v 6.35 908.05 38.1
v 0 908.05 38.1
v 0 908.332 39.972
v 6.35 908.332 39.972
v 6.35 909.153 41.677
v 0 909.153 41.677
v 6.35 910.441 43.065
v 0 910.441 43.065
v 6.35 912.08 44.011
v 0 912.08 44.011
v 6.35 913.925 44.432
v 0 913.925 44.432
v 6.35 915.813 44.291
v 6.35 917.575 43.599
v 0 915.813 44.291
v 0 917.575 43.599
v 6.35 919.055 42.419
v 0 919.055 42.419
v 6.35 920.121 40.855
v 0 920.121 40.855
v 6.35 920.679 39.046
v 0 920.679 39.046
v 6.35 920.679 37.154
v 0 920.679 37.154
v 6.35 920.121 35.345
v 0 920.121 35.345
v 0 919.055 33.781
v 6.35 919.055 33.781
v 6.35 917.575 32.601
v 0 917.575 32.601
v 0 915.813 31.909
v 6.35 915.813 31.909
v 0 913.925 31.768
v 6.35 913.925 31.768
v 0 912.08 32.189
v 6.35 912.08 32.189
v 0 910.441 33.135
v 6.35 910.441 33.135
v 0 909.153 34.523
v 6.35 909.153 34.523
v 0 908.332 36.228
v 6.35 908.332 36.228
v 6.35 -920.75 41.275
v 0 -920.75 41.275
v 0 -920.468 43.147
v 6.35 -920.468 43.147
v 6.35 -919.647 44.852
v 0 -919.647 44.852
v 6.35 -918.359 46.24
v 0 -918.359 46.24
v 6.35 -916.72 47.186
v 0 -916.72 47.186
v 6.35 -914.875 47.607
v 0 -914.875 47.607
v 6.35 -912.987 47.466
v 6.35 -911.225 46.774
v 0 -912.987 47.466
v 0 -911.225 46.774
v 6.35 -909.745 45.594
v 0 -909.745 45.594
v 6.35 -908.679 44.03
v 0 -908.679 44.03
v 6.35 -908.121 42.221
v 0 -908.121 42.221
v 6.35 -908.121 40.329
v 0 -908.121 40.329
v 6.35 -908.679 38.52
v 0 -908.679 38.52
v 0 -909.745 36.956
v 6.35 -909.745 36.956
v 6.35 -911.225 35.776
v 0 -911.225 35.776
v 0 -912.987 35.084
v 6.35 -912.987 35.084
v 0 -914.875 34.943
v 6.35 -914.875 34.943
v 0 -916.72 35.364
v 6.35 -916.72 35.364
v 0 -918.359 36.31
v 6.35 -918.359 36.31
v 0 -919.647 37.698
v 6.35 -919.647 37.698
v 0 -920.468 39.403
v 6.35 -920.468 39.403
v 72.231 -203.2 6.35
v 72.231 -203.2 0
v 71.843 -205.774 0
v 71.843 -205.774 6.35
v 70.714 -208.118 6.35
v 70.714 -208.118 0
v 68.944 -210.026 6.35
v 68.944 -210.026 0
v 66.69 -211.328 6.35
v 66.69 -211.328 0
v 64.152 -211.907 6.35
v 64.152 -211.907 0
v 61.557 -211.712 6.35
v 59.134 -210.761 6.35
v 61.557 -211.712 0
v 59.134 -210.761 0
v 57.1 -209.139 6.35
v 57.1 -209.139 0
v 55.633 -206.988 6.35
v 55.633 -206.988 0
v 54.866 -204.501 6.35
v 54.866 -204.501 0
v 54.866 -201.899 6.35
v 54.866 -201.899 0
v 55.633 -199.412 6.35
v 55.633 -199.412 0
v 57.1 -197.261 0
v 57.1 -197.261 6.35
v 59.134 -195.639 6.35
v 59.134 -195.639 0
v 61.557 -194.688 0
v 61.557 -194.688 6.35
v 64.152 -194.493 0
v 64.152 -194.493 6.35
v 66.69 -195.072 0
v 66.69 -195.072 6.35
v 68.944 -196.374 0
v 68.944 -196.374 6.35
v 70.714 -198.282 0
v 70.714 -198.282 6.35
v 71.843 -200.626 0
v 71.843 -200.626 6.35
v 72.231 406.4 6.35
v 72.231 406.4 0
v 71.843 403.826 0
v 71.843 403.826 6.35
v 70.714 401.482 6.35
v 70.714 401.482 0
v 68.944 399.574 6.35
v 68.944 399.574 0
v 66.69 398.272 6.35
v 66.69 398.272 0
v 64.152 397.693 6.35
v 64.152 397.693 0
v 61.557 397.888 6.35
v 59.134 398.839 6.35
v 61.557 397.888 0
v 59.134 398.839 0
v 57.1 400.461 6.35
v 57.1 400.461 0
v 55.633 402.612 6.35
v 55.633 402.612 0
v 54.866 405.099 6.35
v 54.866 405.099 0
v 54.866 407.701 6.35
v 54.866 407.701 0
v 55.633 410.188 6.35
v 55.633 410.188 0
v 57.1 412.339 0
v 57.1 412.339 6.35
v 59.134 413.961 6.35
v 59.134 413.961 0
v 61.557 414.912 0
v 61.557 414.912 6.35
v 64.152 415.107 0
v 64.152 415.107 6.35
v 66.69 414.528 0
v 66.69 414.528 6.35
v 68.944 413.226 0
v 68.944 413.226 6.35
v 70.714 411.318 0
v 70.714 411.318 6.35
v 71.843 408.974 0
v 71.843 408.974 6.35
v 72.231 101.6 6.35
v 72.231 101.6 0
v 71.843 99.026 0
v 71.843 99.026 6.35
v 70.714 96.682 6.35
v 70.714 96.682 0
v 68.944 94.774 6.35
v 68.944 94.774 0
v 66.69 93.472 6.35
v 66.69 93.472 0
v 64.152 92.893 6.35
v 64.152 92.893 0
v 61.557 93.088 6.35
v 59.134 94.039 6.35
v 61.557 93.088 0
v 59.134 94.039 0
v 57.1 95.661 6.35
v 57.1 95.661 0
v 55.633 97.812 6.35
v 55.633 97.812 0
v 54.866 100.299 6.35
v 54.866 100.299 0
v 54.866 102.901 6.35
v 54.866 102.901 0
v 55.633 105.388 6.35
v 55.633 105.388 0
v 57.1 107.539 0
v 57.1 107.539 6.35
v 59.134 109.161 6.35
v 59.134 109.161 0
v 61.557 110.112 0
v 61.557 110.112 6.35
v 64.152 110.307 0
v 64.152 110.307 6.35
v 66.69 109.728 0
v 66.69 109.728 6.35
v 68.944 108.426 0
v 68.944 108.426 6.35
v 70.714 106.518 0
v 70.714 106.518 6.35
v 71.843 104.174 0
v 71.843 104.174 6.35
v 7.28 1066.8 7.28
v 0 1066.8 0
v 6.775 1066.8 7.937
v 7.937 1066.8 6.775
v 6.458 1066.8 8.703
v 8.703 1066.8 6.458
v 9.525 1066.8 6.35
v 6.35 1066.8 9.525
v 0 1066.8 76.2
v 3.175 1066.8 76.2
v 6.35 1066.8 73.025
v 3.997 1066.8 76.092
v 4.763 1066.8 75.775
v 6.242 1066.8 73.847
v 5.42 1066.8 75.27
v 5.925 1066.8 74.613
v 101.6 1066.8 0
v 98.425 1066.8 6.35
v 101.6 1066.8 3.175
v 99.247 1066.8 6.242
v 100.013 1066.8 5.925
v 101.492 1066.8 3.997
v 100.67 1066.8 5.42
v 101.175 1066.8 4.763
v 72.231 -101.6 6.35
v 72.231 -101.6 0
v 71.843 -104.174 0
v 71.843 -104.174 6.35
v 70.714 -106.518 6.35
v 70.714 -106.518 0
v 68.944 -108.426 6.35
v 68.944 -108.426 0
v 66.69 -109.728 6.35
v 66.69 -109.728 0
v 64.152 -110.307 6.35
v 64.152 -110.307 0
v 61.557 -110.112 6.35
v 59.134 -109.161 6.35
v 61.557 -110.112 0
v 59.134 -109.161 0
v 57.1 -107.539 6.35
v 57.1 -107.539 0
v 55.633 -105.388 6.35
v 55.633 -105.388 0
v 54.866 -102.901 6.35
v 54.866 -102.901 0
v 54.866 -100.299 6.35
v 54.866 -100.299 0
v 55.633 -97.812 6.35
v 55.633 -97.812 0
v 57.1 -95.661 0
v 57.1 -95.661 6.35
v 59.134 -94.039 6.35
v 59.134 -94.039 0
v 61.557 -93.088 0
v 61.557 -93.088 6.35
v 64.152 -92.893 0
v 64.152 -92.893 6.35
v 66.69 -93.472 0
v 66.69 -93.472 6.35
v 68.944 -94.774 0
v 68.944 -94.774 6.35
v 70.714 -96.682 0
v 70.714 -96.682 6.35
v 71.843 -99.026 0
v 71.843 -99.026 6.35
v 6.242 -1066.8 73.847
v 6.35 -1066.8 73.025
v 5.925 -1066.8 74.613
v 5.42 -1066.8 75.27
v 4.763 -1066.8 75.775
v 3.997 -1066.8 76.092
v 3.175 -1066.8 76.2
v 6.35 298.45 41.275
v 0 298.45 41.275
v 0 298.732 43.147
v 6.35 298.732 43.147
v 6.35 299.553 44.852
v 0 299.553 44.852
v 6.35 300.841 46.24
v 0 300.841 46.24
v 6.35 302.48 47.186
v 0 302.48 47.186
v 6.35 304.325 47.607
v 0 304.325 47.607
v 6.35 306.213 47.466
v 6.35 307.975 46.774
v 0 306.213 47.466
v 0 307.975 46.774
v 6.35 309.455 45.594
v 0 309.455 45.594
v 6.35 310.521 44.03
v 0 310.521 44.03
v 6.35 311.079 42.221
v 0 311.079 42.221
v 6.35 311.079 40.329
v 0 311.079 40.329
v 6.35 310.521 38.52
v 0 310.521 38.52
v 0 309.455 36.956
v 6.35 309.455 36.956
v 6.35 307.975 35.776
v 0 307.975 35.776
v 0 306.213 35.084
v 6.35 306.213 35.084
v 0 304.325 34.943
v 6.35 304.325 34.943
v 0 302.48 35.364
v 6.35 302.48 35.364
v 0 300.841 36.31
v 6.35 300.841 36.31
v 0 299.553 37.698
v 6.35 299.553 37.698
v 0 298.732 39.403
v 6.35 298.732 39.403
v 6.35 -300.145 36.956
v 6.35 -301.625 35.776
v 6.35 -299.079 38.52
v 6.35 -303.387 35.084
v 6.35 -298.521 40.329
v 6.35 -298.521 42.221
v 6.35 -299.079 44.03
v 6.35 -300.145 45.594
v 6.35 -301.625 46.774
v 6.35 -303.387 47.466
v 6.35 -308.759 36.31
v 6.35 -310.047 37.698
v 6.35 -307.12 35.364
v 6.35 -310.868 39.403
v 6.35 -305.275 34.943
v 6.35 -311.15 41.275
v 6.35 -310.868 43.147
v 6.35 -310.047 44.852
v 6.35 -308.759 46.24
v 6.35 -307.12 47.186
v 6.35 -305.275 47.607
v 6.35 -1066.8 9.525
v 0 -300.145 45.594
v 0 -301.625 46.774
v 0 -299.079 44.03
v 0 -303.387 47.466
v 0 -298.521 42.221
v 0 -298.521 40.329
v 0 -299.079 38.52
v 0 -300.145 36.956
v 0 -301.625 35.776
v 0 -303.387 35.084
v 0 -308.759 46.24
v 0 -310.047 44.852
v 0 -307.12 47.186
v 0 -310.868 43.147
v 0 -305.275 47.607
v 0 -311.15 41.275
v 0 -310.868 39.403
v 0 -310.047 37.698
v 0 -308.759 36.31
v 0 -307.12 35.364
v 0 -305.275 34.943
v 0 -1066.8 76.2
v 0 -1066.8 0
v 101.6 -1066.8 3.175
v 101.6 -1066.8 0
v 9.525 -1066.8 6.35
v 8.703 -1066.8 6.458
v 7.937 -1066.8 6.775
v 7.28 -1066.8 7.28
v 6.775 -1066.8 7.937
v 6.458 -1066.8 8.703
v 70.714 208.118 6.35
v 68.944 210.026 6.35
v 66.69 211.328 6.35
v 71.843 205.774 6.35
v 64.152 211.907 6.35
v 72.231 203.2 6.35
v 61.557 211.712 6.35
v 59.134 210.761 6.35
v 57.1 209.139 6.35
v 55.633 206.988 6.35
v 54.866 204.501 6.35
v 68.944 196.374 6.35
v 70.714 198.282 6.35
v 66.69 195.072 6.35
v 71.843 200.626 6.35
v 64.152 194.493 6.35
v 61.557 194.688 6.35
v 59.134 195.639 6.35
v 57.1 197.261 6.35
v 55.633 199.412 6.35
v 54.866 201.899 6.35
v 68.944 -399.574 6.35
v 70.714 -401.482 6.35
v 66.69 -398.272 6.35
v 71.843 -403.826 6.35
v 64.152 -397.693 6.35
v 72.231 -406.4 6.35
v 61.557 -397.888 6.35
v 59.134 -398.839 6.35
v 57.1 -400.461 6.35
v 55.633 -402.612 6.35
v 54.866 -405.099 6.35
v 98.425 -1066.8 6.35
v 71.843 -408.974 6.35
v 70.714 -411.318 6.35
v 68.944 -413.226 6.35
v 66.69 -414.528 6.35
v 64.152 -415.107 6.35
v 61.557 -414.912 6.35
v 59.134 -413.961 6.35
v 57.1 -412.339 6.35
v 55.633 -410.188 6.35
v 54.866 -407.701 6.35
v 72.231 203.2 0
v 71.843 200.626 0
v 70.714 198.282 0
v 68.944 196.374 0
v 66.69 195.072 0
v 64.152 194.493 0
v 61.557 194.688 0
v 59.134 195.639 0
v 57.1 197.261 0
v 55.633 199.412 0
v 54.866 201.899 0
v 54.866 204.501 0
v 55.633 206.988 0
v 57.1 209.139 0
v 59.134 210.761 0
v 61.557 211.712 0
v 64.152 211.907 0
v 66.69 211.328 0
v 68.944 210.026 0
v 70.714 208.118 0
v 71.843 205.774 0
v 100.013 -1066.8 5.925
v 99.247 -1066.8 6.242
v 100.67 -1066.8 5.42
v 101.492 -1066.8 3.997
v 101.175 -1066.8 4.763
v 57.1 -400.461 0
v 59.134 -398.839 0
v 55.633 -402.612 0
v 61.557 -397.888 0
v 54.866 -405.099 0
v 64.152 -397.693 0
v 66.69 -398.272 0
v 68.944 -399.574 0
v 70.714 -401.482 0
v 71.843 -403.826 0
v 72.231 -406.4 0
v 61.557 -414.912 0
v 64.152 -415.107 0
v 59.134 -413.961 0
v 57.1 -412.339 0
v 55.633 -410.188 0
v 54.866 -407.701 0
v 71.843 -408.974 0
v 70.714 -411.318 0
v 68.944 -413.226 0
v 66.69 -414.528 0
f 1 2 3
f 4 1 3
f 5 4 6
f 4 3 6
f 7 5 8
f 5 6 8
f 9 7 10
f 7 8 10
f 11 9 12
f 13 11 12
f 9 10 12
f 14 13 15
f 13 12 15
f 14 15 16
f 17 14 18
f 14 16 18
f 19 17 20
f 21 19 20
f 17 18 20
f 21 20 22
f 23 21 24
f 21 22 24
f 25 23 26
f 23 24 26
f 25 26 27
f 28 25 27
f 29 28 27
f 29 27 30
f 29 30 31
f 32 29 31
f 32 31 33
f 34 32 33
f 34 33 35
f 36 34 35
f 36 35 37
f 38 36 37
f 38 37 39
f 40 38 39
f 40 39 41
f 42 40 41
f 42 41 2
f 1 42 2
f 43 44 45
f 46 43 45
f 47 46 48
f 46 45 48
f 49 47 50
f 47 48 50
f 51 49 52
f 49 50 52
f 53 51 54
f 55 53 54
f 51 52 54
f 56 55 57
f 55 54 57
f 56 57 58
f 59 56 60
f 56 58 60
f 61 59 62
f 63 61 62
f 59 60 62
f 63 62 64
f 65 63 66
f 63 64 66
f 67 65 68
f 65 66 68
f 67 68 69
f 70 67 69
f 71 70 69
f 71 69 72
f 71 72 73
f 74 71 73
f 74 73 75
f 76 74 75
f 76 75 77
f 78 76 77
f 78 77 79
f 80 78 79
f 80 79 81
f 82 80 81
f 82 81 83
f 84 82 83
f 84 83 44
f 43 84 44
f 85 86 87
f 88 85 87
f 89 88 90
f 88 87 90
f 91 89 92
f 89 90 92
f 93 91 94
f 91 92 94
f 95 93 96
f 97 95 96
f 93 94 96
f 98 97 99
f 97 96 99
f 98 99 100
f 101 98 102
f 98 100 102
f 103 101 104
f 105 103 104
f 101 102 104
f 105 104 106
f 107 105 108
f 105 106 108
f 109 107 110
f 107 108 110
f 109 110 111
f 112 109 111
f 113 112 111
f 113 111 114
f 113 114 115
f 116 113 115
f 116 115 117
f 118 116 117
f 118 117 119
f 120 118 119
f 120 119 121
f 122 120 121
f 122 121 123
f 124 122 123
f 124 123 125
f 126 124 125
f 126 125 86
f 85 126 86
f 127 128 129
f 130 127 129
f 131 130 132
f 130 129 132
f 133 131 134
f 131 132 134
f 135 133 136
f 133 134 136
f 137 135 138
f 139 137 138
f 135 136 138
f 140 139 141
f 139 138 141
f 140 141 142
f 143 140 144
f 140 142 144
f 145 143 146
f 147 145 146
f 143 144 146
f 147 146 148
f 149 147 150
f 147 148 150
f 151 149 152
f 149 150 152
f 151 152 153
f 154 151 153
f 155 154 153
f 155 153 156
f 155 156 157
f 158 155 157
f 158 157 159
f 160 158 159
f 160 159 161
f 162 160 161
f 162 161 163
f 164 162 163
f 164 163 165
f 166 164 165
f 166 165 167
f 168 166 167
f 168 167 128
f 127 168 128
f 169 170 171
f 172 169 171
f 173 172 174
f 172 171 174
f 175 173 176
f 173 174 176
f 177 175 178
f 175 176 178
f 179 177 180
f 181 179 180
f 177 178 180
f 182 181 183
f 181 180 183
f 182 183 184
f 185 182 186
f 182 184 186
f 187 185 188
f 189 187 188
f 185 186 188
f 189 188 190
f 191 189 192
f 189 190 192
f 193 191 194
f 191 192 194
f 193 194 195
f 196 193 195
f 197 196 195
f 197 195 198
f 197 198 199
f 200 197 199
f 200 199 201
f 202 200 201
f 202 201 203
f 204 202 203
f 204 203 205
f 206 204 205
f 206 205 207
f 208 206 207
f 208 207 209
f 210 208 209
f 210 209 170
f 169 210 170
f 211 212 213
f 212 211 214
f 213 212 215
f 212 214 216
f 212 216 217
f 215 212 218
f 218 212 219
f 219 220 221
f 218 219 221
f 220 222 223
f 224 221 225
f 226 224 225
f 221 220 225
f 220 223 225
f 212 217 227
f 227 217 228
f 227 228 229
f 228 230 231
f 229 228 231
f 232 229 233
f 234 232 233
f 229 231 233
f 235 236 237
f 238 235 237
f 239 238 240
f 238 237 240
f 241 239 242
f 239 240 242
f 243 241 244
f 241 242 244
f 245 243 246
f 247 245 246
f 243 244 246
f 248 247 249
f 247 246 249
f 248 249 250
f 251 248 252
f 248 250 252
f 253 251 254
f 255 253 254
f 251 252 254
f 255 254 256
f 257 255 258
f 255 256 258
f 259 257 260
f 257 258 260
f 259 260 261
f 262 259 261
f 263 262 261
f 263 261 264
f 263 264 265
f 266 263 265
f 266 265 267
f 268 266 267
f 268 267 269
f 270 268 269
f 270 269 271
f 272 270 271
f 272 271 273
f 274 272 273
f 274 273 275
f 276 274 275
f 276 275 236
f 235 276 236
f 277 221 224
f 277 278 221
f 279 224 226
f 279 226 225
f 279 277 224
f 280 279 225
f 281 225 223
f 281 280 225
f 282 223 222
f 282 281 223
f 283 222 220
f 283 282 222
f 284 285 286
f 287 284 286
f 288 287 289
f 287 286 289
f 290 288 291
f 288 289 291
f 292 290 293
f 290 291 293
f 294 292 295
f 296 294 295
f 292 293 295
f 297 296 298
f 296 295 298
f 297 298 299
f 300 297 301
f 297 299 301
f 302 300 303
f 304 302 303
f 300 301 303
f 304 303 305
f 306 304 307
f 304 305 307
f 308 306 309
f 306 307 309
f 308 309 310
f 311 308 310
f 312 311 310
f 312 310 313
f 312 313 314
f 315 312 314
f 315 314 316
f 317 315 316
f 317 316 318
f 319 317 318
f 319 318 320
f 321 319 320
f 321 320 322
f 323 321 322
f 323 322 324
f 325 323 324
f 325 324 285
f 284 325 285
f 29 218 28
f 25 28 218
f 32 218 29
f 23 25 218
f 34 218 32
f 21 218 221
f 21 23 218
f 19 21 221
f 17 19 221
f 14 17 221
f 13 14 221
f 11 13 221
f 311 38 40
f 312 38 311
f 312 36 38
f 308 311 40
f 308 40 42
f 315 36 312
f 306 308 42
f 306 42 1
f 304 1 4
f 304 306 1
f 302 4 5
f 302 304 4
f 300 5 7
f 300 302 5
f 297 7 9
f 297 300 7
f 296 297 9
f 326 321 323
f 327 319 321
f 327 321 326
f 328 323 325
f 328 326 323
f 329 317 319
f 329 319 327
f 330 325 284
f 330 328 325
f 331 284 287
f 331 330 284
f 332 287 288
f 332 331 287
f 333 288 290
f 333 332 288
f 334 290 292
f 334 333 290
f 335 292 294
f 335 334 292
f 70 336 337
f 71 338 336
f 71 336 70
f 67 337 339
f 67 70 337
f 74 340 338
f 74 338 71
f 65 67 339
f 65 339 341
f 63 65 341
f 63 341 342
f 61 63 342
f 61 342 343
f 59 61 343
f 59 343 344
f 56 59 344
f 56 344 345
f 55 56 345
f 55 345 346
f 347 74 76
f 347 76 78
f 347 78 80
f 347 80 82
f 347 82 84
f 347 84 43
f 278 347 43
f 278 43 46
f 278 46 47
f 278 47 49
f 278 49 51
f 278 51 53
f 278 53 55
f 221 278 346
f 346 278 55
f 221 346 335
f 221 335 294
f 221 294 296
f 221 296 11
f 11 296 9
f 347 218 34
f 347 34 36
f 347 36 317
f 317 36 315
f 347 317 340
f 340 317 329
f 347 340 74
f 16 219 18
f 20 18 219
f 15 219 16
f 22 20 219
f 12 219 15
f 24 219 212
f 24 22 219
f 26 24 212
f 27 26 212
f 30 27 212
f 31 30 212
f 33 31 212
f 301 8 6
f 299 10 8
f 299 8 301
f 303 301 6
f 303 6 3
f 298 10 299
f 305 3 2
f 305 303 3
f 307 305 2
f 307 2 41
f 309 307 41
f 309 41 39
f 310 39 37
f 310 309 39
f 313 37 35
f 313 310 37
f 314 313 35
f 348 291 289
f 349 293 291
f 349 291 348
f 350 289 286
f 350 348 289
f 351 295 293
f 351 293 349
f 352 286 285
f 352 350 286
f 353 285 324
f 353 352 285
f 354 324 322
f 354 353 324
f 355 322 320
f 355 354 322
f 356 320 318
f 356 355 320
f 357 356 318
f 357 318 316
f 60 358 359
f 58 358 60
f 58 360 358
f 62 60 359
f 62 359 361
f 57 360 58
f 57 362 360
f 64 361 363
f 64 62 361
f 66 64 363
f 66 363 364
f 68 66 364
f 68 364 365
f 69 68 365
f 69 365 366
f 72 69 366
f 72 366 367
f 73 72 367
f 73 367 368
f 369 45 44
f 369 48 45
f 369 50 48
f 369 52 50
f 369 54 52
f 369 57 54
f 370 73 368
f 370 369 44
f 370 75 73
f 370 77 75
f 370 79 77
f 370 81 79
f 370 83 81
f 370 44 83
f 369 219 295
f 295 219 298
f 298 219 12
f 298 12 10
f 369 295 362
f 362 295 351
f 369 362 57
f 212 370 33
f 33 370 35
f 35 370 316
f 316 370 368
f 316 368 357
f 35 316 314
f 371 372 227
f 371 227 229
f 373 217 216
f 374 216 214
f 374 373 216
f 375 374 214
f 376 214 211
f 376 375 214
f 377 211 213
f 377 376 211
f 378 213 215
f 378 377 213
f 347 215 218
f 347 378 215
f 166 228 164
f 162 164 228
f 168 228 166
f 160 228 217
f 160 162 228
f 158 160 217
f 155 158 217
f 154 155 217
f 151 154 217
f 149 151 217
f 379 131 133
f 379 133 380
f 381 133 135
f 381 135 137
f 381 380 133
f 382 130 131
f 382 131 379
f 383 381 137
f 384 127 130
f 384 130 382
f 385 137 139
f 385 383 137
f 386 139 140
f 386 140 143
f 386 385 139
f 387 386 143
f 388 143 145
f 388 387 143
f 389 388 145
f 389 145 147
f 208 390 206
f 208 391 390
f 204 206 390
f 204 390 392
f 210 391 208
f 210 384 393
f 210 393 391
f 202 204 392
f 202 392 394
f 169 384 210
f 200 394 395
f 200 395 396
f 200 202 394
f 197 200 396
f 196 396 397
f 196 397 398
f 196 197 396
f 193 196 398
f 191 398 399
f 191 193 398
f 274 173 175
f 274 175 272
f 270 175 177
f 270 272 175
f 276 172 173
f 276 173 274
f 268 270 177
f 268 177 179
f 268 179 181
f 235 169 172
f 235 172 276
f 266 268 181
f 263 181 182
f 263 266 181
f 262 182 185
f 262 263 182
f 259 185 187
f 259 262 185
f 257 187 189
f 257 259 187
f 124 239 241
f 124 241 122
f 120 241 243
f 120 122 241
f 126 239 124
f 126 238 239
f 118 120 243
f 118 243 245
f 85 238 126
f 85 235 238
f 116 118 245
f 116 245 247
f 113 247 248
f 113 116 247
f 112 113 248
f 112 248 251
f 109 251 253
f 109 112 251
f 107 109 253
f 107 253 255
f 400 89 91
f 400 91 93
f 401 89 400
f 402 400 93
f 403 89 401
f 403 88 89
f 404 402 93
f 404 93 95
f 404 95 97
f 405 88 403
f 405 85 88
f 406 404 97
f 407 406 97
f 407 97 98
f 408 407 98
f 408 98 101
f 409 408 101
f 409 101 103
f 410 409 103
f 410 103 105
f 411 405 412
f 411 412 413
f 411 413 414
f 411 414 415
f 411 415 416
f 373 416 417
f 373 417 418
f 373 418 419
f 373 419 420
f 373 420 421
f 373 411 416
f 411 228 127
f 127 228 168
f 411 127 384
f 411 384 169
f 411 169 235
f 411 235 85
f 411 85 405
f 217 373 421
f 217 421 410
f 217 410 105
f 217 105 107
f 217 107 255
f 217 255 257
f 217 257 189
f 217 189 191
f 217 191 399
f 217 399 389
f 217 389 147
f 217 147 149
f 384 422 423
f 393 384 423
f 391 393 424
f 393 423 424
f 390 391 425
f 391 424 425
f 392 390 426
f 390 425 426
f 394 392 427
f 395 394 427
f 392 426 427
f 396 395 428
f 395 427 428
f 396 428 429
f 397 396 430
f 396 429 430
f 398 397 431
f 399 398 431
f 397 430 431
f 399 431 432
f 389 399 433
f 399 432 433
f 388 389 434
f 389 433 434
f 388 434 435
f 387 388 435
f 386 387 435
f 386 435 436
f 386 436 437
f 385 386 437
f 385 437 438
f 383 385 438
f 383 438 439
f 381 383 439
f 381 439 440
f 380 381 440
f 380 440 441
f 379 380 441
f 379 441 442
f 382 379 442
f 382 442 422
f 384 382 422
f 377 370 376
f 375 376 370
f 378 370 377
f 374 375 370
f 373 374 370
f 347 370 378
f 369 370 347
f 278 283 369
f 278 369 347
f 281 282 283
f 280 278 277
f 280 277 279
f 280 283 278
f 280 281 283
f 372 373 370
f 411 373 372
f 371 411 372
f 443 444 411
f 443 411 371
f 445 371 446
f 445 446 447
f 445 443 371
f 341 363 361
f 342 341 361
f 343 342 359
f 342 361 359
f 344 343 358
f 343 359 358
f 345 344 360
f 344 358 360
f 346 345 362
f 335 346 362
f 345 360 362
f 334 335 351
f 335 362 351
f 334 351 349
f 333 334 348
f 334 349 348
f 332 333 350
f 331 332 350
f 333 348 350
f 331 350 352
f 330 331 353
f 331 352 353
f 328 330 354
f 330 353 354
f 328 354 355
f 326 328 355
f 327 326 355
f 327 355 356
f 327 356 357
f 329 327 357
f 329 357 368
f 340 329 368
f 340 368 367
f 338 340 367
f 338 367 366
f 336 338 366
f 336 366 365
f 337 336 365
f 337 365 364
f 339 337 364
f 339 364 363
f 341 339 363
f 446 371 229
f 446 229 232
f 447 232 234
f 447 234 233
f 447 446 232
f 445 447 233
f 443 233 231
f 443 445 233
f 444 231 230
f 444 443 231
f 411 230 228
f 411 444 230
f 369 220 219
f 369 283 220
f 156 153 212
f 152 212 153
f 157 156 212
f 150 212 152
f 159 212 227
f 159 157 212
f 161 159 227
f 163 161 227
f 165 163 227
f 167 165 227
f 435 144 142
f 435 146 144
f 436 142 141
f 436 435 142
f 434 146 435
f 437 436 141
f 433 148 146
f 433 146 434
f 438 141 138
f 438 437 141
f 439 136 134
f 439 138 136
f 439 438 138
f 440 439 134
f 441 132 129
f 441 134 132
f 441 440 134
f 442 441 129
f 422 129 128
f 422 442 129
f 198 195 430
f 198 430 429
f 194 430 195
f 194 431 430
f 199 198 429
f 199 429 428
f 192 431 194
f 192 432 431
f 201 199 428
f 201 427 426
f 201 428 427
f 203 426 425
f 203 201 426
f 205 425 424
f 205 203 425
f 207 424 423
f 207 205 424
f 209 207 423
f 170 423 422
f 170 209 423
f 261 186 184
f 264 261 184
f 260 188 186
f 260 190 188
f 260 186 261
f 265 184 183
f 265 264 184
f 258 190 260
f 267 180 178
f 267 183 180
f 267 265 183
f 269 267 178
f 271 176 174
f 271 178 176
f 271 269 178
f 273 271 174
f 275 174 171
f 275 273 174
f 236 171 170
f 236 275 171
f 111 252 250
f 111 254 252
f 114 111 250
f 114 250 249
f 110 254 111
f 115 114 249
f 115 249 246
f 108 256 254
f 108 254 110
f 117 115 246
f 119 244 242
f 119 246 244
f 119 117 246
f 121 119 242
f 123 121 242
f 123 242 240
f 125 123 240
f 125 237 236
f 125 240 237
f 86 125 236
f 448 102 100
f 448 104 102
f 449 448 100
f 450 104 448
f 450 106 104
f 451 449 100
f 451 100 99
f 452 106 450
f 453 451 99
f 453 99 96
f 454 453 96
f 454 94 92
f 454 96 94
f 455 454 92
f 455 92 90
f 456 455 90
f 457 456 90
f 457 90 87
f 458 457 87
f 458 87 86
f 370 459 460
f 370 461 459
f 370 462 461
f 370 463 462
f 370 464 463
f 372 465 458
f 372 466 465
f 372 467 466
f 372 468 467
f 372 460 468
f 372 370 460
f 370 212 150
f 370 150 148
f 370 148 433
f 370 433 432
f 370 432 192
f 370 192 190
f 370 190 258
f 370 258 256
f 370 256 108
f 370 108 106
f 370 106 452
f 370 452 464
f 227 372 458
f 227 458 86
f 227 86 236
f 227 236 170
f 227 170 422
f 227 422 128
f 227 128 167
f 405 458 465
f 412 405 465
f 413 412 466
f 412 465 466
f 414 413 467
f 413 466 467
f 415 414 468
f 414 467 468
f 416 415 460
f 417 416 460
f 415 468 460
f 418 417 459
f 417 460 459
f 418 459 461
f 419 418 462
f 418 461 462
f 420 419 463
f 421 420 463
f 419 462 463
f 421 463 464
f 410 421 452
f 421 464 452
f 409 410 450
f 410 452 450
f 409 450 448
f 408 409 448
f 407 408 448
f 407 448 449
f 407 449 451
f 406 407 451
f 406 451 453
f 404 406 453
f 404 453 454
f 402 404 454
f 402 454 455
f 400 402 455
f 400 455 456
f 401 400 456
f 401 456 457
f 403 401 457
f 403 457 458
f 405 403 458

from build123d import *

# Parameters (mm, degrees)
F1_DEPTH = 1066.8
F2_R     = 8.73125
F3_DEPTH = 76.201
F4_R     = 6.35
F5_DEPTH = 101.601


with BuildPart() as f1:
    # F0 (on Front) → F1 (new body, symmetric)
    with BuildSketch(Plane.XZ):
        with BuildLine():
            Line((3.175, 76.2), (0, 76.2))
            Line((0, 76.2), (0, 0))
            Line((0, 0), (101.6, 0))
            Line((101.6, 0), (101.6, 3.175))
            ThreePointArc((101.6, 3.175), (100.6700640303, 5.4200640303), (98.425, 6.35))
            Line((98.425, 6.35), (9.525, 6.35))
            ThreePointArc((9.525, 6.35), (7.2799359697, 7.2799359697), (6.35, 9.525))
            Line((6.35, 9.525), (6.35, 73.025))
            ThreePointArc((6.35, 73.025), (5.4200640303, 75.2700640303), (3.175, 76.2))
        make_face()
    extrude(amount=F1_DEPTH, both=True)

    # F2 (on face) → F3 (cut, through all)
    with BuildSketch(Plane(origin=(0, 0, 0), x_dir=(1, 0, 0), z_dir=(0, 0, -1))):
        with Locations((63.5, -203.2)):
            Circle(F2_R)
        with Locations((63.5, -406.4)):
            Circle(F2_R)
        with Locations((63.5, -101.6)):
            Circle(F2_R)
        with Locations((63.5, 101.6)):
            Circle(F2_R)
        with Locations((63.5, 203.2)):
            Circle(F2_R)
        with Locations((63.5, 406.4)):
            Circle(F2_R)
    extrude(amount=-F3_DEPTH, mode=Mode.SUBTRACT)

    # F4 (on face) → F5 (cut, through all)
    with BuildSketch(Plane(origin=(0, 0, 0), x_dir=(0, -1, 0), z_dir=(-1, 0, 0))):
        with Locations((-304.8, 41.275)):
            Circle(F4_R)
        with Locations((304.8, 41.275)):
            Circle(F4_R)
        with Locations((-914.4, 38.1)):
            Circle(F4_R)
        with Locations((914.4, 41.275)):
            Circle(F4_R)
    extrude(amount=-F5_DEPTH, mode=Mode.SUBTRACT)


solid = f1.part
